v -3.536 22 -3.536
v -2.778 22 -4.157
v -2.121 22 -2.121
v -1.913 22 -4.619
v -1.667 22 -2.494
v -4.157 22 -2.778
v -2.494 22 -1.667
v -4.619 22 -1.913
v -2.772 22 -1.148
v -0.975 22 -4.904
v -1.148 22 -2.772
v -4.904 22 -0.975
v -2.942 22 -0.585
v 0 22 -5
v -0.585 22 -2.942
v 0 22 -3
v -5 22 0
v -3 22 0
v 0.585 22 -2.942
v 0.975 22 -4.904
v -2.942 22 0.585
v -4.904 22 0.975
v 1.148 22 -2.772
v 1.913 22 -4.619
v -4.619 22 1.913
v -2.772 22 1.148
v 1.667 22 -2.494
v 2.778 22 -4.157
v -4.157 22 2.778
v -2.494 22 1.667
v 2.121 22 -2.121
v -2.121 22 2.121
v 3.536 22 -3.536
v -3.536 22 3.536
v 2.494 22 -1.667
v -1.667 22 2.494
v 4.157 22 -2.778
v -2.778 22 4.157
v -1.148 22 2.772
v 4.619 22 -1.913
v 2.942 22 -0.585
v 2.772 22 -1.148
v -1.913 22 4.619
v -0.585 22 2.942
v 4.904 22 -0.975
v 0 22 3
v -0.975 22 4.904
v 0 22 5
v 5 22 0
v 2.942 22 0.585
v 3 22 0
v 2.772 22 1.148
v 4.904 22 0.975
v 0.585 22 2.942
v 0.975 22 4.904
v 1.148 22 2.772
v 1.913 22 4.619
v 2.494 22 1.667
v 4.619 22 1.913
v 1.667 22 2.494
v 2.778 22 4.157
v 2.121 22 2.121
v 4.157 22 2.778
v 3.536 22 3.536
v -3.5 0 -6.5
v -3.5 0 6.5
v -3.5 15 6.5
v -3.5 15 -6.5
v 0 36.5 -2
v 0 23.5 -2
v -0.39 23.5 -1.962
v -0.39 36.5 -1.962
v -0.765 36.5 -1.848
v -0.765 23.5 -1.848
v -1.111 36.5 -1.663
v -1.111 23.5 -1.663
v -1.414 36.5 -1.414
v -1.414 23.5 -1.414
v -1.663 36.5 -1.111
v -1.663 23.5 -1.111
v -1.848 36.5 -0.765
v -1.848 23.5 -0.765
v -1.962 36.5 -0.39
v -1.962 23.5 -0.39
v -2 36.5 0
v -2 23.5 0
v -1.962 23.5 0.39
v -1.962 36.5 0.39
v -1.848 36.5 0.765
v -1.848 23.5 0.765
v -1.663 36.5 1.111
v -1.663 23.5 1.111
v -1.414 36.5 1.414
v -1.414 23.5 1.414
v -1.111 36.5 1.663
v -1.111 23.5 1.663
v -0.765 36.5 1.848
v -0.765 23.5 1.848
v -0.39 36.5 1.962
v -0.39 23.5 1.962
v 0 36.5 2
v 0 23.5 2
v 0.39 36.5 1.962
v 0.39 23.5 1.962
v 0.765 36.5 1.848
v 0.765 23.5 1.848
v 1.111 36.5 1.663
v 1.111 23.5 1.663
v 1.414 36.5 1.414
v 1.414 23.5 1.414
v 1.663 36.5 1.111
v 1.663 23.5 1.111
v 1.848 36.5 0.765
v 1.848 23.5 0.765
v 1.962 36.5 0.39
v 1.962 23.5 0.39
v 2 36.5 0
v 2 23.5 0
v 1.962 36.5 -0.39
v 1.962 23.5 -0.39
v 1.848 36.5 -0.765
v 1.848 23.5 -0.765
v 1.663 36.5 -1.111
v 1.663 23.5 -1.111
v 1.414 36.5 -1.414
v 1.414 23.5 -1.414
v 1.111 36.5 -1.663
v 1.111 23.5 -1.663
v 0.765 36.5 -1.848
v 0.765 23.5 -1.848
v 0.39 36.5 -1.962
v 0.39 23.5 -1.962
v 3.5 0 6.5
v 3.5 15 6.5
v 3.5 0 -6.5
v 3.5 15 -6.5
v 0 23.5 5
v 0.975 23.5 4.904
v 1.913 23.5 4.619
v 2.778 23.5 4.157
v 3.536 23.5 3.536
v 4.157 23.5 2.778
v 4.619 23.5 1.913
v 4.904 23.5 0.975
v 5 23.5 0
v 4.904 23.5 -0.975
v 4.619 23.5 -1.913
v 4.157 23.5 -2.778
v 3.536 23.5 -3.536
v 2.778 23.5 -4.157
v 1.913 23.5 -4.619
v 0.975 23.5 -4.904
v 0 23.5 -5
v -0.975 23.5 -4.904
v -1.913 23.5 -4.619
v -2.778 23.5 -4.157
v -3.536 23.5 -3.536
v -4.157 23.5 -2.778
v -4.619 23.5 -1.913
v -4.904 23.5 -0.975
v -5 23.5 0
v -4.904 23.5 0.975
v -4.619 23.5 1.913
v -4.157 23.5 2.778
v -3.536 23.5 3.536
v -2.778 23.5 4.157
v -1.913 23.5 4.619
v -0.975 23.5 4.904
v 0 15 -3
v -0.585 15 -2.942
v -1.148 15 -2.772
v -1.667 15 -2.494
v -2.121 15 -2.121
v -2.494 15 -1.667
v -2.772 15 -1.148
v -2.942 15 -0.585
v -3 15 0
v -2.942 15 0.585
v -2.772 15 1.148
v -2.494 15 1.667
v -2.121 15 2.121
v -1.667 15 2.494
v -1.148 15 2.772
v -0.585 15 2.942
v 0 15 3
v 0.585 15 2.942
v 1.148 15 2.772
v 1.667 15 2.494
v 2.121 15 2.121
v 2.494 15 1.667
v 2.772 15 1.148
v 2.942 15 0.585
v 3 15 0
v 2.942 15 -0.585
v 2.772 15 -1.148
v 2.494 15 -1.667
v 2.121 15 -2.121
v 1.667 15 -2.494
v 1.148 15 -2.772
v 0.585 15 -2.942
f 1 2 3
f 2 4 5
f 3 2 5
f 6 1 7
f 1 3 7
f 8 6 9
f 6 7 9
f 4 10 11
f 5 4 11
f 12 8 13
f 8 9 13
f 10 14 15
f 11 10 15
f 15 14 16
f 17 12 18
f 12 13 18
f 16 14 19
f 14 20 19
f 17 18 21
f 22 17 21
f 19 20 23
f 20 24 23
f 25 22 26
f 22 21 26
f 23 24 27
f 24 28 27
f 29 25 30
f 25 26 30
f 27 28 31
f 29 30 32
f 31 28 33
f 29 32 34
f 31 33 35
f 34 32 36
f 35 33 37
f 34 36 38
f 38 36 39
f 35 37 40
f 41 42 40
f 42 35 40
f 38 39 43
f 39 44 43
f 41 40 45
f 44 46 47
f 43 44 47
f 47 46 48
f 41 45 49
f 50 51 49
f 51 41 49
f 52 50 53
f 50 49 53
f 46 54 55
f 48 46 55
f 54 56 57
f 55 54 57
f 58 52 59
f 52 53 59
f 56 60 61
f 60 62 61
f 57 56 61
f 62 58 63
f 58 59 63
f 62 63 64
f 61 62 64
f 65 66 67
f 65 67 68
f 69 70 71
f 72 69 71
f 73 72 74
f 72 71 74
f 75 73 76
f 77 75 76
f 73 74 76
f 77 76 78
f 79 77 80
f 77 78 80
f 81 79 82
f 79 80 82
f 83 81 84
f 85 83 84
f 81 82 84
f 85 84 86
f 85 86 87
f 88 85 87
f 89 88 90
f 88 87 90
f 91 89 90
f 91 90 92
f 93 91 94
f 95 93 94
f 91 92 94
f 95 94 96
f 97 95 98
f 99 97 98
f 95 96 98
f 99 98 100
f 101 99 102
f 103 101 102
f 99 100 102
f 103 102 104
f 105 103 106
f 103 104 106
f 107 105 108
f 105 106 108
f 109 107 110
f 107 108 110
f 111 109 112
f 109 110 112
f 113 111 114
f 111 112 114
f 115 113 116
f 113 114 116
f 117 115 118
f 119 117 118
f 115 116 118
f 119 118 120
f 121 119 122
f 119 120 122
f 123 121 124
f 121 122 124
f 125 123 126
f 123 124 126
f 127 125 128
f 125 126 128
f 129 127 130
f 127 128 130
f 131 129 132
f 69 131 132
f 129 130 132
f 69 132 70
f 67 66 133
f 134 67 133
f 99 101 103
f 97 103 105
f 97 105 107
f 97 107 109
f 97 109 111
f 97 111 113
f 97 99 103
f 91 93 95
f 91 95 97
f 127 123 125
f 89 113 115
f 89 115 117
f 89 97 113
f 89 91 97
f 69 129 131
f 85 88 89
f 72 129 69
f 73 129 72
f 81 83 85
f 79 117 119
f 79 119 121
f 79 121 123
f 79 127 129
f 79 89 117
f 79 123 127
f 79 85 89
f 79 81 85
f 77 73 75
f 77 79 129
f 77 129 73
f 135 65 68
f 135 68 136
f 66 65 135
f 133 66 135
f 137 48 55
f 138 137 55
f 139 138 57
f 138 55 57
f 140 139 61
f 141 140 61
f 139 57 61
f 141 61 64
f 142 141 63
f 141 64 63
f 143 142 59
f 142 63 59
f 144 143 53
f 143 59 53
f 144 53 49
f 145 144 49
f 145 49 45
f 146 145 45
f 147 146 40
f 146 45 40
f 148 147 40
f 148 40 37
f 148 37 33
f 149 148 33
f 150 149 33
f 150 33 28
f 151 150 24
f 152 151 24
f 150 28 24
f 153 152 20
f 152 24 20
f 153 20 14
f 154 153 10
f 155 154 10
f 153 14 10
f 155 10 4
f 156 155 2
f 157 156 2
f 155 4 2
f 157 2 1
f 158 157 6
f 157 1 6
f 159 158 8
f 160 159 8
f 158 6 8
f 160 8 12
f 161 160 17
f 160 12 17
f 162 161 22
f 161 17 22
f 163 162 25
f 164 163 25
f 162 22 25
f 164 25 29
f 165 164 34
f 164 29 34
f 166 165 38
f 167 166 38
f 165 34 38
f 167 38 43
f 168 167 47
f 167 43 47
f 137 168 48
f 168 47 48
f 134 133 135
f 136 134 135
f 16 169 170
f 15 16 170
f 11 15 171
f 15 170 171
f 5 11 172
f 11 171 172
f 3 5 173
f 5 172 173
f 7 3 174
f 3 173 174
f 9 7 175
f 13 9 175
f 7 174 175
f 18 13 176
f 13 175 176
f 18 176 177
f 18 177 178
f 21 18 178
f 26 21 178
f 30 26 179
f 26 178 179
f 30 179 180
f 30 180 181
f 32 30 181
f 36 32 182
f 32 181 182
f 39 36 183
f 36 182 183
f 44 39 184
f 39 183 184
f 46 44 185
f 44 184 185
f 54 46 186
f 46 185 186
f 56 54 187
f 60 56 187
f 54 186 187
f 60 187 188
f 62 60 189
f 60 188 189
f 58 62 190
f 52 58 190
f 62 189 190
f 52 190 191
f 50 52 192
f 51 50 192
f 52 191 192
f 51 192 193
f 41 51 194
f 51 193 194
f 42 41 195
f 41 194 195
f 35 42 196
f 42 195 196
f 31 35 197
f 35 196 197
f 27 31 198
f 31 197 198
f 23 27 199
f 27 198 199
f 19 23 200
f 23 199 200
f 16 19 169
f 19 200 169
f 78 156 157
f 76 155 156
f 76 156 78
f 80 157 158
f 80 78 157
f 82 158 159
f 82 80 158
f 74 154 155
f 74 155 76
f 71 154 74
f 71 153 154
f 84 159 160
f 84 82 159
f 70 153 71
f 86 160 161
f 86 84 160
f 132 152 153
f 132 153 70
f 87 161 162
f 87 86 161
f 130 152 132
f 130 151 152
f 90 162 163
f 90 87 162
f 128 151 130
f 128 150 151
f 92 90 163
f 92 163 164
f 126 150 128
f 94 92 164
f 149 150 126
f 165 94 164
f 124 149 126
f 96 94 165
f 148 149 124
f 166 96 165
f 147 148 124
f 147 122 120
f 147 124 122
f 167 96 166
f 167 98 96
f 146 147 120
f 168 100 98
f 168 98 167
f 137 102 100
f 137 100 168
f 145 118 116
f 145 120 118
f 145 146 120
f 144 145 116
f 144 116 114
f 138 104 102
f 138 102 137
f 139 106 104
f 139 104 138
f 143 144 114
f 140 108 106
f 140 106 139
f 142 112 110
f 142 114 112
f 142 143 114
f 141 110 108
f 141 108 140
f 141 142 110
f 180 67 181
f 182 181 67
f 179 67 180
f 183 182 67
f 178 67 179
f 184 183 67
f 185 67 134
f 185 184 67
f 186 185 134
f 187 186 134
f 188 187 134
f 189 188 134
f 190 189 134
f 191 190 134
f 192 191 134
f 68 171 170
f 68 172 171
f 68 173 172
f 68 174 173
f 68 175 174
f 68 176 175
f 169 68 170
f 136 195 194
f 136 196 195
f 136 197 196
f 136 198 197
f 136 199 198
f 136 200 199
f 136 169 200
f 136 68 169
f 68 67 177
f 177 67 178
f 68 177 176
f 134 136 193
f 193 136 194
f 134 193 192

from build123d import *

# Parameters (mm, degrees)
ESQUISSE1_W      = 7
ESQUISSE1_H      = 13
EXTRUSION1_DEPTH = 15
ESQUISSE2_R      = 3
EXTRUSION2_DEPTH = 7
ESQUISSE3_R      = 5
EXTRUSION3_DEPTH = 1.5
ESQUISSE4_R      = 2
EXTRUSION4_DEPTH = 13


with BuildPart() as part:
    # Esquisse1 → Extrusion1 (new body)
    with BuildSketch(Plane(origin=(0, 0, 0), x_dir=(1, 0, 0), z_dir=(0, 1, 0))):
        Rectangle(ESQUISSE1_W, ESQUISSE1_H)
    extrude(amount=EXTRUSION1_DEPTH)

    # Esquisse2 → Extrusion2 (add)
    with BuildSketch(Plane(origin=(0, 15, 0), x_dir=(-1, 0, 0), z_dir=(0, 1, 0))):
        with Locations(Location((0, 0, 0), (0, 0, 270))):
            Circle(ESQUISSE2_R)
    extrude(amount=EXTRUSION2_DEPTH)

    # Esquisse3 → Extrusion3 (add)
    with BuildSketch(Plane(origin=(0, 22, 0), x_dir=(-1, 0, 0), z_dir=(0, 1, 0))):
        with Locations(Location((0, 0, 0), (0, 0, 90))):
            Circle(ESQUISSE3_R)
    extrude(amount=EXTRUSION3_DEPTH)

    # Esquisse4 → Extrusion4 (add)
    with BuildSketch(Plane(origin=(0, 23.5, 0), x_dir=(-1, 0, 0), z_dir=(0, 1, 0))):
        with Locations(Location((0, 0, 0), (0, 0, 270))):
            Circle(ESQUISSE4_R)
    extrude(amount=EXTRUSION4_DEPTH)


solid = part.part
